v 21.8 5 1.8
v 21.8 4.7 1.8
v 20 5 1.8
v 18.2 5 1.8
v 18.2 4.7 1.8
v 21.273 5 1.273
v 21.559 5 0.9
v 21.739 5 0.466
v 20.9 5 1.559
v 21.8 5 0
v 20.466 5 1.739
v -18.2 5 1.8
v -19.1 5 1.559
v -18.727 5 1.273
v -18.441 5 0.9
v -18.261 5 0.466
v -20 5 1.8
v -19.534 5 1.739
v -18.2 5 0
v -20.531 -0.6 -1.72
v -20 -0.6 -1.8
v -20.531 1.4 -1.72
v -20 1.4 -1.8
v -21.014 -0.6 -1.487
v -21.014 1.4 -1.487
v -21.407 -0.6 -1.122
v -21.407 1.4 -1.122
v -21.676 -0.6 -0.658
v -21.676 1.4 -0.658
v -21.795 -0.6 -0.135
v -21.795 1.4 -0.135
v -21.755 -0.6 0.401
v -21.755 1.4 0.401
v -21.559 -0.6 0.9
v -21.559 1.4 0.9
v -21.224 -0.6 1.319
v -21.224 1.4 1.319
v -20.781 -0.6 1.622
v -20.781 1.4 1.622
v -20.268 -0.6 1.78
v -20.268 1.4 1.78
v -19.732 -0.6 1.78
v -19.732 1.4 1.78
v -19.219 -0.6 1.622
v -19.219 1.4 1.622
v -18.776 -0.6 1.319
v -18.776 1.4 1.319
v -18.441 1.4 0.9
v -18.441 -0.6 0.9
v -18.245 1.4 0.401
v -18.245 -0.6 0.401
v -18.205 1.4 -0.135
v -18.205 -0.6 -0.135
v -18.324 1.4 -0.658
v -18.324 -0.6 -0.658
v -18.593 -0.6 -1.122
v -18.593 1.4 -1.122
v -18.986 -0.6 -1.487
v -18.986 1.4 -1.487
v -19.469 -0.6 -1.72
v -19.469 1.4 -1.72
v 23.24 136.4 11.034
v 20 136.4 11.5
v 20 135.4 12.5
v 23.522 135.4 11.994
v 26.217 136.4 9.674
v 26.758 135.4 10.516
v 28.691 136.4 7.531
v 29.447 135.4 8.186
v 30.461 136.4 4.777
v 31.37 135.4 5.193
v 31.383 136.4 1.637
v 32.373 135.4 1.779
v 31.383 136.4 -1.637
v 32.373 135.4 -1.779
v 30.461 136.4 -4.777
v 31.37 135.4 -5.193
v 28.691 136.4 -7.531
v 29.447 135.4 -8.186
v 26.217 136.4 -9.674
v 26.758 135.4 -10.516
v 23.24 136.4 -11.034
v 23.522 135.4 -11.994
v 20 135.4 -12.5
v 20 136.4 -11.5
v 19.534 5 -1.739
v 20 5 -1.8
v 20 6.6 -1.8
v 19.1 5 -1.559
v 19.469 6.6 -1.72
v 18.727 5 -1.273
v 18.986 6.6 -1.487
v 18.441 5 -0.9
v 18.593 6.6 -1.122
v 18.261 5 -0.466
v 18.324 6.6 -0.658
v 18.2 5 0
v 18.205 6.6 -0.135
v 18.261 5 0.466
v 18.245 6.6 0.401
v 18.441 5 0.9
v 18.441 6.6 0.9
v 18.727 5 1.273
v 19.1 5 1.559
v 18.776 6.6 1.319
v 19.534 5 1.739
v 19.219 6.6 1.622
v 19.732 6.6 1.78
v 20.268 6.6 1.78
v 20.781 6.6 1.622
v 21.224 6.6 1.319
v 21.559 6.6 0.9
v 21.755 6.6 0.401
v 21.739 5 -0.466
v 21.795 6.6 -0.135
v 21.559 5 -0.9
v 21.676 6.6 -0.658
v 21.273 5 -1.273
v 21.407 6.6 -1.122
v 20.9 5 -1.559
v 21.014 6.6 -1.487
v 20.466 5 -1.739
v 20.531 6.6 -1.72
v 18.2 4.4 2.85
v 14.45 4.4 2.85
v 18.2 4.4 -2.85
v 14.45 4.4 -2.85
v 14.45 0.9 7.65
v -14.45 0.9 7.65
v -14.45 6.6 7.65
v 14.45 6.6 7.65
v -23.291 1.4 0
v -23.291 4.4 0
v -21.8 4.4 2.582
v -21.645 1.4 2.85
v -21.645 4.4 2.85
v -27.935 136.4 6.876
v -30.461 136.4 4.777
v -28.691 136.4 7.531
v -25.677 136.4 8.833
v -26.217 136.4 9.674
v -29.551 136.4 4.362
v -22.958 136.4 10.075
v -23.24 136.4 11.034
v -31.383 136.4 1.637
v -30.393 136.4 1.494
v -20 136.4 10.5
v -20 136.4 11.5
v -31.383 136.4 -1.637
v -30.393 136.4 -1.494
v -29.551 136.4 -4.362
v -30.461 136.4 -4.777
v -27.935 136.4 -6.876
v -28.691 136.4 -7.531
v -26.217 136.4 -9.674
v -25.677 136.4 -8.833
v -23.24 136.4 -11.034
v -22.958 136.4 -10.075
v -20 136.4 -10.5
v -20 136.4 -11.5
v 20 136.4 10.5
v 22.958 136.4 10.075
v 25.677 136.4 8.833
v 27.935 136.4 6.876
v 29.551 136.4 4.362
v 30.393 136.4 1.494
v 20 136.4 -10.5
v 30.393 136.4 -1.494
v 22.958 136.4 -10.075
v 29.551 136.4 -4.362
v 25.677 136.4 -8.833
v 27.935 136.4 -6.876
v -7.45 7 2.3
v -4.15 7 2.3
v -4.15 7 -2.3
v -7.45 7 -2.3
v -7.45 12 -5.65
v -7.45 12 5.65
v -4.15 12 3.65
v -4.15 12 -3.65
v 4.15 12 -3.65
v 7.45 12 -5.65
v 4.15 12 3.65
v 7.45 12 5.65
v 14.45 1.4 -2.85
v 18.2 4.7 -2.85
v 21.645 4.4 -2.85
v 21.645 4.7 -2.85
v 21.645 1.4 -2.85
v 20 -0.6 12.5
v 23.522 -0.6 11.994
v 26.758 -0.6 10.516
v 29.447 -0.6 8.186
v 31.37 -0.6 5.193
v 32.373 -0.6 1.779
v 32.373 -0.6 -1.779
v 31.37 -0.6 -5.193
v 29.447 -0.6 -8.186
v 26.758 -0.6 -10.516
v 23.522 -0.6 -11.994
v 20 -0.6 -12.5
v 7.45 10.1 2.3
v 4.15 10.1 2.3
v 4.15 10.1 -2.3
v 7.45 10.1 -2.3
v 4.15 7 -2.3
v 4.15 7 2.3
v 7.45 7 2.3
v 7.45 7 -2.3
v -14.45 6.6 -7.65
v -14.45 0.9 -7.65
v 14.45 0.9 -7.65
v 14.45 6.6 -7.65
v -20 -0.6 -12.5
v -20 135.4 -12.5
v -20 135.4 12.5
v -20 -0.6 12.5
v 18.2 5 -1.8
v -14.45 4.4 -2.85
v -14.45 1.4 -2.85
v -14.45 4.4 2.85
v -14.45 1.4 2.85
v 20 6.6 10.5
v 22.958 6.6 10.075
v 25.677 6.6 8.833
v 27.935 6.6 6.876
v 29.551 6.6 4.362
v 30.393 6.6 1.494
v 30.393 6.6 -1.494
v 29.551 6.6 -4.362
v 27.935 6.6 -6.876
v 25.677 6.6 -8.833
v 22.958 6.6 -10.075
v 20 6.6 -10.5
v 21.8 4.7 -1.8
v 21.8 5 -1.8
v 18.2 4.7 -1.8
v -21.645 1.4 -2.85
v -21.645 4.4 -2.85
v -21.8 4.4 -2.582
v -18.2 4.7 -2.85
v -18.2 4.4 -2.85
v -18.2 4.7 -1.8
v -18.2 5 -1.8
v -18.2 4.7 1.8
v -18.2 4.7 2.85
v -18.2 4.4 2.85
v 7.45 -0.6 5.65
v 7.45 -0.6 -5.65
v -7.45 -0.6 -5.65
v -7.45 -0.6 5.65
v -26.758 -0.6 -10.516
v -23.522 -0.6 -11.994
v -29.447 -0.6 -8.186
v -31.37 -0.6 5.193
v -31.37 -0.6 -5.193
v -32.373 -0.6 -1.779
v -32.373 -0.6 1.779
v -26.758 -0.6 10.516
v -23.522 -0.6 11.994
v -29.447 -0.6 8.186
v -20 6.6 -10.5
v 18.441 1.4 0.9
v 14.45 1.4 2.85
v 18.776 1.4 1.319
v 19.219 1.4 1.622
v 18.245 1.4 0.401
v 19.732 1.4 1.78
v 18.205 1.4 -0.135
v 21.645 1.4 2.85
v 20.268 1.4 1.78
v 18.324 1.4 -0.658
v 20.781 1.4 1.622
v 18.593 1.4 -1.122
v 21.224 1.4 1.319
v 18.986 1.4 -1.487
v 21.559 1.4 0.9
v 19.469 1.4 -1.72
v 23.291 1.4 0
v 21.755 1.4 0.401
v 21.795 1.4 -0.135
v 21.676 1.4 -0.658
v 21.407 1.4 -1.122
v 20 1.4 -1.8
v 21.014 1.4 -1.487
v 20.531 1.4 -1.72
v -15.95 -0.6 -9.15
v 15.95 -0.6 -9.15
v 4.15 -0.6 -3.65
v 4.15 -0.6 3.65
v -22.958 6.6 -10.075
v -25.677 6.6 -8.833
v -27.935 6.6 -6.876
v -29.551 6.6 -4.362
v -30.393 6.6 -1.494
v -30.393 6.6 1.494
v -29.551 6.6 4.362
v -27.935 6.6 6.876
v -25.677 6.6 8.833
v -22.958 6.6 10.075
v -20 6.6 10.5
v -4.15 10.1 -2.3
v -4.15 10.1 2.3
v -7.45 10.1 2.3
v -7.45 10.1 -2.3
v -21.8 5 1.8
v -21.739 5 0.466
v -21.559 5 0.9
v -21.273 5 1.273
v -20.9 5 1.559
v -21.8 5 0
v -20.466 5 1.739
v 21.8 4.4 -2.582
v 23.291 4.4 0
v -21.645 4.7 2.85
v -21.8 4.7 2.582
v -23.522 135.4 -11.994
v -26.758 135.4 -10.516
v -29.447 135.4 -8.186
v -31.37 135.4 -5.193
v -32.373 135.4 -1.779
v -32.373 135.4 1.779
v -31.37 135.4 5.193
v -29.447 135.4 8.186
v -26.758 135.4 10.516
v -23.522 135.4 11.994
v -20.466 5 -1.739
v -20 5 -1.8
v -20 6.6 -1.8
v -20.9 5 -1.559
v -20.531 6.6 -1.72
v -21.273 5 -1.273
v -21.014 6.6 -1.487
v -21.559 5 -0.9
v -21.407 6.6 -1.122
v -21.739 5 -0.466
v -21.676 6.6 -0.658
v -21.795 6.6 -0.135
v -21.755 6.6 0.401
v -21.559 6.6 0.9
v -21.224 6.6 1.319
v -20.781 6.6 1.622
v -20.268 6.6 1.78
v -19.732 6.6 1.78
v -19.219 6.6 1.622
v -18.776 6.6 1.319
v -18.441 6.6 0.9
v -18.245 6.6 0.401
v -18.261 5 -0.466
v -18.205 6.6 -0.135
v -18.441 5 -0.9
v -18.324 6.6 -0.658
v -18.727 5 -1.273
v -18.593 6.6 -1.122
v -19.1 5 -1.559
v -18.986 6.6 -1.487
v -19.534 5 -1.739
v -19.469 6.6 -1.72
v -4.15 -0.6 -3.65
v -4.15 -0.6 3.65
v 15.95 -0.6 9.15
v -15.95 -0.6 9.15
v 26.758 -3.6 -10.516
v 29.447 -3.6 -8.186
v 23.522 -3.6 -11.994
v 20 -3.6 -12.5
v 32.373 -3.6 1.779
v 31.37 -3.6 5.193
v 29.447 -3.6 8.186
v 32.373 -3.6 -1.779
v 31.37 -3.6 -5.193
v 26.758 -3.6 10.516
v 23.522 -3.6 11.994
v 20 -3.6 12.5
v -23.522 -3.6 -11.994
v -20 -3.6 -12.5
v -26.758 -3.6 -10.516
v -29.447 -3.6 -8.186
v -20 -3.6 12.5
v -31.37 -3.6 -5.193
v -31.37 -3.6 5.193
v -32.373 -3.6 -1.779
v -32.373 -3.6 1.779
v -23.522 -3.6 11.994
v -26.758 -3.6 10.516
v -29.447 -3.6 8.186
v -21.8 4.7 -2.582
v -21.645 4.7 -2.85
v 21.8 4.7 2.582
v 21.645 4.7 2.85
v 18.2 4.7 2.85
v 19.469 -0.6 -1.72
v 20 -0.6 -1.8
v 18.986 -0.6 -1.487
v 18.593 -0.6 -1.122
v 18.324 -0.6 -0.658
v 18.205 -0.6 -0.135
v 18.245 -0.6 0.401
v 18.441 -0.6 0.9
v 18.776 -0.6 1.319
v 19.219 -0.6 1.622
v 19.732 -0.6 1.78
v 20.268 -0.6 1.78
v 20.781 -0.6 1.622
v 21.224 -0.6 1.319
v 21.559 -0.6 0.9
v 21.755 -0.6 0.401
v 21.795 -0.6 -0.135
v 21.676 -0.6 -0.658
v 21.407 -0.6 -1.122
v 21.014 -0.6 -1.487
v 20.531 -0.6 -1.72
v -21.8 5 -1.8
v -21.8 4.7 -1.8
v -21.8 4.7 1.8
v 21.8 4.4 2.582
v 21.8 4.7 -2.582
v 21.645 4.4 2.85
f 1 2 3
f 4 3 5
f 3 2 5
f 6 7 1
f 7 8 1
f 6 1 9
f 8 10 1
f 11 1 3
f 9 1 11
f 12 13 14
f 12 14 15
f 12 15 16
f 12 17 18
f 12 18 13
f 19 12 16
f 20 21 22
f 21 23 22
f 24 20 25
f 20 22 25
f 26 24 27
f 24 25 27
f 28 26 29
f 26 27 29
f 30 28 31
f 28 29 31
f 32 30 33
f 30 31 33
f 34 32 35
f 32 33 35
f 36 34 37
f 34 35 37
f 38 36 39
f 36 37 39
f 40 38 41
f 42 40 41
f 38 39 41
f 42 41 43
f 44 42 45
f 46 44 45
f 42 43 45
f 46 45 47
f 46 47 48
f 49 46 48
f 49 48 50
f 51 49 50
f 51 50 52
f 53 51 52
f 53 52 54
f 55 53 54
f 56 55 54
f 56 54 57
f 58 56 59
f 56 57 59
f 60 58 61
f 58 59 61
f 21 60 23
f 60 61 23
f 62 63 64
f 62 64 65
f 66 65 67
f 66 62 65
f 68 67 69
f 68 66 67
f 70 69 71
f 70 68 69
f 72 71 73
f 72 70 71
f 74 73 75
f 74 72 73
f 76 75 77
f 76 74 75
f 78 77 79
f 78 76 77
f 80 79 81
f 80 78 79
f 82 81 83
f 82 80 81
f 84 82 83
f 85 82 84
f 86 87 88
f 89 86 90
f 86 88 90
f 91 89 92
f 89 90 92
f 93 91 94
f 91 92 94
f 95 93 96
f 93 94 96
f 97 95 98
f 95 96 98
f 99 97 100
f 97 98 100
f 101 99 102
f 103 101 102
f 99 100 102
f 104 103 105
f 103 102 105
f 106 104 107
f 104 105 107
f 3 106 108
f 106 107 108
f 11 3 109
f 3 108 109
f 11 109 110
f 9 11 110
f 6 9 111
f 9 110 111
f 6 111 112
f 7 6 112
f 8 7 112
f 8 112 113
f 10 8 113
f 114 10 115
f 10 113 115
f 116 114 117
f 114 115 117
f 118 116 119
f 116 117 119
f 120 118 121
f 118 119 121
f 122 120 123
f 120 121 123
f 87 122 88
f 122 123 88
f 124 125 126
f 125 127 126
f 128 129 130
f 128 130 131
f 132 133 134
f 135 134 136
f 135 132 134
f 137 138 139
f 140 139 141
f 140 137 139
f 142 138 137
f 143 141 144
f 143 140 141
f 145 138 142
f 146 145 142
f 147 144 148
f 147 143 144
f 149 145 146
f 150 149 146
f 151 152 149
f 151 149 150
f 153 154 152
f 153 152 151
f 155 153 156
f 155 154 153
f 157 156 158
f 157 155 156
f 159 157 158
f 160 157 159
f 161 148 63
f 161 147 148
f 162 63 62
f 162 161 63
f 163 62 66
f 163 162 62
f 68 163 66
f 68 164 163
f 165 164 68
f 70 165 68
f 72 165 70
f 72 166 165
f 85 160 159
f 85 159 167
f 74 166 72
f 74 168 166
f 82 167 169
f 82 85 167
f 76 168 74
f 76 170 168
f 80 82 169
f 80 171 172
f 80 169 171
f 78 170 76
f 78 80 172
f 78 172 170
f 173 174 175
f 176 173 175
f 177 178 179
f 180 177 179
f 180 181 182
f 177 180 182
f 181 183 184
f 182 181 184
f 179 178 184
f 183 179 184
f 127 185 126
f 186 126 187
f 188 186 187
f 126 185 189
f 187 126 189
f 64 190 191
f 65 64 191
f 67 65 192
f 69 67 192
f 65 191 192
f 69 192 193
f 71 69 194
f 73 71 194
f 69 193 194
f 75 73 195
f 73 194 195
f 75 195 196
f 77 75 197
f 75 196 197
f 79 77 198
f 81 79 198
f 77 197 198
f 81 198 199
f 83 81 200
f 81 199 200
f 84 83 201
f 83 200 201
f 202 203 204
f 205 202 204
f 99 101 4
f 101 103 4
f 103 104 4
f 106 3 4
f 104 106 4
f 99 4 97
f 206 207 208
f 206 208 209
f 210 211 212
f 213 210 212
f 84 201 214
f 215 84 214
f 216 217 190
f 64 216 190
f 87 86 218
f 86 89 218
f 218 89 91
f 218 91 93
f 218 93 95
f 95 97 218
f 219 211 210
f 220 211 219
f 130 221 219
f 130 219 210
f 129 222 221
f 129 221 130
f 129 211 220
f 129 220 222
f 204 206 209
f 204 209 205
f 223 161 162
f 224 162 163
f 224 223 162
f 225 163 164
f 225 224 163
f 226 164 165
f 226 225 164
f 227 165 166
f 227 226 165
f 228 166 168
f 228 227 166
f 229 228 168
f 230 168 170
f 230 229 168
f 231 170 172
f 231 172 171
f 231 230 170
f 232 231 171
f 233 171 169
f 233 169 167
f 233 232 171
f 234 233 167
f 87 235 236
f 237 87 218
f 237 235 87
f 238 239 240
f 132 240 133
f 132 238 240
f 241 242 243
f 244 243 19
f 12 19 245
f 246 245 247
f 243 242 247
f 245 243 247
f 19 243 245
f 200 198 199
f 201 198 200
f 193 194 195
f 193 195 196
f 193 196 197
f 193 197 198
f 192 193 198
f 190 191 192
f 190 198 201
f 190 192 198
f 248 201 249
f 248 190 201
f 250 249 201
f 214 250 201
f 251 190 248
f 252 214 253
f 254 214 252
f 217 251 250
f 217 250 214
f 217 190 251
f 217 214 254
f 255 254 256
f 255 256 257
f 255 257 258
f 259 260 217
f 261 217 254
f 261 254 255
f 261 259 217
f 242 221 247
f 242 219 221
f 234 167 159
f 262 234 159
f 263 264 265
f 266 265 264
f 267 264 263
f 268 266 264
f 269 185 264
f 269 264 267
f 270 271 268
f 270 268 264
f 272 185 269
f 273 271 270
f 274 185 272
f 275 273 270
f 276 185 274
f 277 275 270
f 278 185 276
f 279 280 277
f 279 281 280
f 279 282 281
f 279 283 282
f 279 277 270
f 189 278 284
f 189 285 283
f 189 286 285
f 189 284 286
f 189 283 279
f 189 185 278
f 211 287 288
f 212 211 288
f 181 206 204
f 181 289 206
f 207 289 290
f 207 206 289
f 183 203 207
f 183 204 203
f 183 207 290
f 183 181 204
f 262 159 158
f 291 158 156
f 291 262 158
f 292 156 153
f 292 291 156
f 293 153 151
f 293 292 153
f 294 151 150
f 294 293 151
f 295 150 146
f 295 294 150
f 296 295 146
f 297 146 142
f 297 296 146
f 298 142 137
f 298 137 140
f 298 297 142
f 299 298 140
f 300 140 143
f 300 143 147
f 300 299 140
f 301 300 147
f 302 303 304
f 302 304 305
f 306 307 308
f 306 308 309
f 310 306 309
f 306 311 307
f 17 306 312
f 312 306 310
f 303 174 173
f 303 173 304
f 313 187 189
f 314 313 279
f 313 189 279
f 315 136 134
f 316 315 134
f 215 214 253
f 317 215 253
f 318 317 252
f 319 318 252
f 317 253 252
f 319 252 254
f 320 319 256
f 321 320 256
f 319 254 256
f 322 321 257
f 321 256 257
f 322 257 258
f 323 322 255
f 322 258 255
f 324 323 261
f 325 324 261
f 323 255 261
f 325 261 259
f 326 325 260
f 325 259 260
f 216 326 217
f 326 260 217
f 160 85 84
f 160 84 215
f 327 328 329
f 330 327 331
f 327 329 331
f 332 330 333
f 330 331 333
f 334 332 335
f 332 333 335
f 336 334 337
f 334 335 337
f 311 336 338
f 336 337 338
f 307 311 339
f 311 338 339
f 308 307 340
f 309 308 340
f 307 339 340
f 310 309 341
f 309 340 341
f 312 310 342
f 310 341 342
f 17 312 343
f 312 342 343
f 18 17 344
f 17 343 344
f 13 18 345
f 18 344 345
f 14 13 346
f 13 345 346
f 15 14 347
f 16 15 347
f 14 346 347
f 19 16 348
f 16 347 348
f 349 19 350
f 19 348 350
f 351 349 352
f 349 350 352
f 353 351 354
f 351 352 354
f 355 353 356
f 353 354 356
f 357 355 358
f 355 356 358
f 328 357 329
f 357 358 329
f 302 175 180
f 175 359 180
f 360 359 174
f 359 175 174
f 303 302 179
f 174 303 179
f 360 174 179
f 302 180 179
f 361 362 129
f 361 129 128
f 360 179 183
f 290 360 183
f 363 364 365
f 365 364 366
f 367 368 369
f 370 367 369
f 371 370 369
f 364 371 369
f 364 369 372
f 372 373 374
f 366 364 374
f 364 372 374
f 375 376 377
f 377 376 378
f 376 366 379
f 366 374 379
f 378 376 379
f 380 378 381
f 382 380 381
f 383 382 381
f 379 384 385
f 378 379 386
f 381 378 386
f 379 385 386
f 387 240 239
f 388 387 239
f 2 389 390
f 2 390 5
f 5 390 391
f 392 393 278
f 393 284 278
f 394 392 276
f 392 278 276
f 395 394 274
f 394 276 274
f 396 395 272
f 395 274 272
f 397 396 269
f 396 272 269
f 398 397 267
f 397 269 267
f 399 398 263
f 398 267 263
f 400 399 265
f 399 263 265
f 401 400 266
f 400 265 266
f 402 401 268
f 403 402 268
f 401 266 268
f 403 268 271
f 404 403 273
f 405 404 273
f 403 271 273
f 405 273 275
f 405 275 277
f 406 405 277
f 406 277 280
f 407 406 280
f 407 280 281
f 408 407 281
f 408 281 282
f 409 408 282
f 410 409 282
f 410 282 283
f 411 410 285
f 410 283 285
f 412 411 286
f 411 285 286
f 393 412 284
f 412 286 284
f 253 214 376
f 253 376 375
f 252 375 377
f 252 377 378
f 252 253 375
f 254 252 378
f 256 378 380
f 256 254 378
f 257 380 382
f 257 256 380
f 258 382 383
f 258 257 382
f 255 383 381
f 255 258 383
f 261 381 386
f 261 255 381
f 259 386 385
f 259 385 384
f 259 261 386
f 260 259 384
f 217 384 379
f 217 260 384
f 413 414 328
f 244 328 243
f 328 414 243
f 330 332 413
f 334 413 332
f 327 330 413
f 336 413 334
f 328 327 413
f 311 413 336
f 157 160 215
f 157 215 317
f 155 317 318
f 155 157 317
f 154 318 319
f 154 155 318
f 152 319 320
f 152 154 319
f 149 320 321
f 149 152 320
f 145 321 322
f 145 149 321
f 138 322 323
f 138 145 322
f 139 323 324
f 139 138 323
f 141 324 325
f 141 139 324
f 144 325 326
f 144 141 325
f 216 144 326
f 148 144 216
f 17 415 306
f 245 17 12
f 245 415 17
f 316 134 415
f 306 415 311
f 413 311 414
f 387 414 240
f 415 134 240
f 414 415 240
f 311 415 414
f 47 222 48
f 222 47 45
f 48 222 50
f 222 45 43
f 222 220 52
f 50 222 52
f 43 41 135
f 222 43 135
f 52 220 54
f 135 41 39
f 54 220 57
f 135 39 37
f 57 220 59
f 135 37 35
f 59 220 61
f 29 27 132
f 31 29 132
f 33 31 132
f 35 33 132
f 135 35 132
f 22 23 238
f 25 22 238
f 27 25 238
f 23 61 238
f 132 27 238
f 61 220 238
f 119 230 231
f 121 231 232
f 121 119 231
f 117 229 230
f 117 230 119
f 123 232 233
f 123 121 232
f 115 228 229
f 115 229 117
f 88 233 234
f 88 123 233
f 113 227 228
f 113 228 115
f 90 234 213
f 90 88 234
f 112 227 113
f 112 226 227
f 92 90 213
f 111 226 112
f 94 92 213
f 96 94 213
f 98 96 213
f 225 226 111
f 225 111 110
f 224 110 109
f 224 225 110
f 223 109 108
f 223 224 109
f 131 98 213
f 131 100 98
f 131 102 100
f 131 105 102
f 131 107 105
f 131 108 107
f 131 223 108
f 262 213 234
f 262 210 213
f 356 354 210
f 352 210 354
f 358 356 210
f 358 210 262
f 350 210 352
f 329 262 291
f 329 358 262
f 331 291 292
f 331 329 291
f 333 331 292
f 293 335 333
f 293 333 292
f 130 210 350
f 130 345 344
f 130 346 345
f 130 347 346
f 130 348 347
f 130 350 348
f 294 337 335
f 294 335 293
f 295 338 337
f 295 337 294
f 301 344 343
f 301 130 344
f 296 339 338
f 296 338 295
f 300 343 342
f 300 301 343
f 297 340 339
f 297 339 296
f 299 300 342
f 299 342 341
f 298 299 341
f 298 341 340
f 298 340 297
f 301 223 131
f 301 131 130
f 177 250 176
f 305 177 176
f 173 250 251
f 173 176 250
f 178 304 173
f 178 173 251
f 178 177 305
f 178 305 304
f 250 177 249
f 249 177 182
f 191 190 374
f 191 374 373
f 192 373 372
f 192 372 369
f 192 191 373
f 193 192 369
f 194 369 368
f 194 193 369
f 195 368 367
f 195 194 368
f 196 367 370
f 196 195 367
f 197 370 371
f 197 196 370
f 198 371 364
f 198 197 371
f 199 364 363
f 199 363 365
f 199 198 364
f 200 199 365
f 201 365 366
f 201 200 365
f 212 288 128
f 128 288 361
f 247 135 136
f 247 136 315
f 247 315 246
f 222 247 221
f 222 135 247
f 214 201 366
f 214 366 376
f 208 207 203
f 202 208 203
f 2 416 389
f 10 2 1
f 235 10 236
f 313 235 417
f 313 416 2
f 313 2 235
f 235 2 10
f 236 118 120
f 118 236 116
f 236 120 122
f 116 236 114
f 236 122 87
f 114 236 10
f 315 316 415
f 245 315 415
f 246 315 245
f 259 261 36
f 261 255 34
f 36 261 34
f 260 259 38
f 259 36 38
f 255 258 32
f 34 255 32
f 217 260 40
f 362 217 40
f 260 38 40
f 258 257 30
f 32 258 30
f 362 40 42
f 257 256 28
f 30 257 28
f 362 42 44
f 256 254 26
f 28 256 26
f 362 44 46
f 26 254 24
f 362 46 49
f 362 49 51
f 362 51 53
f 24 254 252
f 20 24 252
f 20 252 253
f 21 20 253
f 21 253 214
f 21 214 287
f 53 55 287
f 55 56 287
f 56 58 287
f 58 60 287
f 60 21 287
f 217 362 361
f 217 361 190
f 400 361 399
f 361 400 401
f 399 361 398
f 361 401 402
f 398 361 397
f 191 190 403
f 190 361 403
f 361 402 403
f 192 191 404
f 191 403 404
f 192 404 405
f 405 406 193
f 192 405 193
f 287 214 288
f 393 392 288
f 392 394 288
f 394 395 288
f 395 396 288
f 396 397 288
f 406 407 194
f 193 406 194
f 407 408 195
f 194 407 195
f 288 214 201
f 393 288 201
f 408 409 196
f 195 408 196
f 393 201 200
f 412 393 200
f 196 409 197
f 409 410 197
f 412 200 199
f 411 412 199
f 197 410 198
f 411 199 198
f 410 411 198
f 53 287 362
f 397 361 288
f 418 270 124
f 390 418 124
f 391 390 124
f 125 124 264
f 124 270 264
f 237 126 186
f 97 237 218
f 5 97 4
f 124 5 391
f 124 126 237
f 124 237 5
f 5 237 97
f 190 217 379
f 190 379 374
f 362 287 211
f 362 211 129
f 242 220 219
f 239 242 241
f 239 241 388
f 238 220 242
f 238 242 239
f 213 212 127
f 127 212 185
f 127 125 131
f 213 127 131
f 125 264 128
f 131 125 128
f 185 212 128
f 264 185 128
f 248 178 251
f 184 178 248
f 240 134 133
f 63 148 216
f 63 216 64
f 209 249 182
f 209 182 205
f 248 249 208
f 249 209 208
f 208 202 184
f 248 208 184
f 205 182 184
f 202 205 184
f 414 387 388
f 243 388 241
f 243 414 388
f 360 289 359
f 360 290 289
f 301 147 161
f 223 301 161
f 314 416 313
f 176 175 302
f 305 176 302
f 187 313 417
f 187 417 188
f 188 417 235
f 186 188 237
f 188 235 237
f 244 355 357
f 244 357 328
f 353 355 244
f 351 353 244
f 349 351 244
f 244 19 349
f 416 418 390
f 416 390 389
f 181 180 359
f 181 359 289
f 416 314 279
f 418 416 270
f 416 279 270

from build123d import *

# Parameters (mm, degrees)
SKETCH2_W                     = 14.9
SKETCH2_H                     = 11.3
SKETCH2_W_2                   = 8.3
SKETCH2_H_2                   = 7.3
BOSS_EXTRUDE1_DEPTH           = 12.6
SKETCH4_W                     = 4.6
SKETCH4_H                     = 3.1
CUT_EXTRUDE1_DEPTH            = 8.45
CUT_EXTRUDE1_DEPTH_BACK       = 8.45
BOSS_EXTRUDE2_DEPTH           = 3
BOSS_EXTRUDE3_DEPTH           = 137
SKETCH8_W                     = 28.9
SKETCH8_H                     = 15.3
BOSS_EXTRUDE4_DEPTH           = 7.2
SKETCH11_W                    = 1.8
SKETCH11_H                    = 137
M3_CLEARANCE_HOLE1_AT_2_COUNT = 2
M3_CLEARANCE_HOLE1_AT_2_PITCH = 40
CUT_EXTRUDE2_DEPTH            = 3
CUT_EXTRUDE3_DEPTH            = 0.3
SKETCH15_W                    = 3.6
SKETCH15_H                    = 3.6
CUT_EXTRUDE4_DEPTH            = 0.3
CHAMFER1_SIZE                 = 1
CHAMFER2_SIZE                 = 1.5


with BuildPart() as part:
    # Sketch2 → Boss-Extrude1 (new body)
    with BuildSketch(Plane.XZ.offset(-12)):
        Rectangle(SKETCH2_W, SKETCH2_H)
        Rectangle(SKETCH2_W_2, SKETCH2_H_2, mode=Mode.SUBTRACT)
    extrude(amount=BOSS_EXTRUDE1_DEPTH)

    # Sketch4 → Cut-Extrude1 (cut, two sides)
    with BuildSketch(Plane(origin=(0, 0, 0), x_dir=(0, 0, -1), z_dir=(1, 0, 0))) as cut_extrude1_sk:
        with Locations((0, 8.55)):
            Rectangle(SKETCH4_W, SKETCH4_H)
    extrude(amount=CUT_EXTRUDE1_DEPTH, mode=Mode.SUBTRACT)
    extrude(cut_extrude1_sk.sketch, amount=-CUT_EXTRUDE1_DEPTH_BACK, mode=Mode.SUBTRACT)

    # Sketch5 → Boss-Extrude2 (add)
    with BuildSketch(Plane.XZ.offset(0.6)):
        with BuildLine():
            Line((-20, 12.5), (20, 12.5))
            ThreePointArc((20, 12.5), (32.5, 0), (20, -12.5))
            Line((20, -12.5), (-20, -12.5))
            ThreePointArc((-20, -12.5), (-32.5, 0), (-20, 12.5))
        make_face()
    extrude(amount=BOSS_EXTRUDE2_DEPTH)


with BuildPart() as body_2:
    # Sketch7 → Boss-Extrude3 (new body)
    with BuildSketch(Plane(origin=(0, -0.6, 0), x_dir=(1, 0, 0), z_dir=(0, 1, 0))):
        with BuildLine():
            Line((-20, -12.5), (20, -12.5))
            ThreePointArc((20, -12.5), (32.5, 0), (20, 12.5))
            Line((20, 12.5), (-20, 12.5))
            ThreePointArc((-20, 12.5), (-32.5, 0), (-20, -12.5))
        make_face()
        with BuildLine():
            Line((-20, -10.5), (20, -10.5))
            ThreePointArc((20, -10.5), (30.5, 0), (20, 10.5))
            Line((20, 10.5), (-20, 10.5))
            ThreePointArc((-20, 10.5), (-30.5, 0), (-20, -10.5))
        make_face(mode=Mode.SUBTRACT)
    extrude(amount=BOSS_EXTRUDE3_DEPTH)

    # Sketch8 → Boss-Extrude4 (add)
    with BuildSketch(Plane.XZ.offset(0.6)):
        with BuildLine():
            Line((20, -12.5), (-20, -12.5))
            ThreePointArc((-20, -12.5), (-32.5, 0), (-20, 12.5))
            Line((-20, 12.5), (20, 12.5))
            ThreePointArc((20, 12.5), (32.5, 0), (20, -12.5))
        make_face()
        Rectangle(SKETCH8_W, SKETCH8_H, mode=Mode.SUBTRACT)
    extrude(amount=-BOSS_EXTRUDE4_DEPTH)

    # Sketch11 → M3 Clearance Hole1 (revolve, cut)
    with BuildSketch(Plane(origin=(-20, -0.6, 0), x_dir=(0, 0, -1), z_dir=(1, 0, 0))):
        with Locations((0.9, 68.5)):
            Rectangle(SKETCH11_W, SKETCH11_H)
    m3_clearance_hole1 = revolve(axis=Axis((-20, -6.95, 0), (0, 1, 0)), mode=Mode.SUBTRACT)

    # M3 Clearance Hole1 at 2: M3 Clearance Hole1 ×2
    with Locations(*[(i * M3_CLEARANCE_HOLE1_AT_2_PITCH, 0, 0) for i in range(1, M3_CLEARANCE_HOLE1_AT_2_COUNT)]):
        add(m3_clearance_hole1, mode=Mode.SUBTRACT)

    # Sketch13 → Cut-Extrude2 (cut)
    with BuildSketch(Plane(origin=(0, 1.4, 0), x_dir=(1, 0, 0), z_dir=(0, 1, 0))):
        Polygon((-14.45, -2.85), (-18.354551733, -2.85), (-16.709103466, 0), (-18.354551733, 2.85), (-14.45, 2.85), align=None)
        Polygon((-18.354551733, -2.85), (-16.709103466, 0), (-18.354551733, 2.85), (-21.645448267, 2.85), (-23.290896534, 0), (-21.645448267, -2.85), align=None)
    cut_extrude2 = extrude(amount=CUT_EXTRUDE2_DEPTH, mode=Mode.SUBTRACT)

    # Sketch14 → Cut-Extrude3 (cut)
    with BuildSketch(Plane.XZ.offset(-4.4)):
        with BuildLine():
            ThreePointArc((-18.2, 0), (-20.00000001, -1.8), (-21.8, 2e-08))
            Line((-21.8, 2e-08), (-21.8, -2.582308546))
            Line((-21.8, -2.582308546), (-21.645448267, -2.85))
            Line((-21.645448267, -2.85), (-18.2, -2.85))
            Line((-18.2, -2.85), (-18.2, 0))
        make_face()
        with BuildLine():
            Line((-18.2, 2.85), (-21.645448267, 2.85))
            Line((-21.645448267, 2.85), (-21.8, 2.582308546))
            Line((-21.8, 2.582308546), (-21.8, 2e-08))
            ThreePointArc((-21.8, 2e-08), (-19.99999999, 1.8), (-18.2, 0))
            Line((-18.2, 0), (-18.2, 2.85))
        make_face()
    cut_extrude3 = extrude(amount=-CUT_EXTRUDE3_DEPTH, mode=Mode.SUBTRACT)

    # Sketch15 → Cut-Extrude4 (cut)
    with BuildSketch(Plane.XZ.offset(-4.7)):
        with Locations((-20, 0)):
            Rectangle(SKETCH15_W, SKETCH15_H)
    cut_extrude4 = extrude(amount=-CUT_EXTRUDE4_DEPTH, mode=Mode.SUBTRACT)

    # Chamfer1
    chamfer1_edges = [body_2.edges().sort_by_distance(p)[0] for p in [
        (32.5, 136.4, 0),
        (0, 136.4, -12.5),
        (-32.5, 136.4, 0),
        (0, 136.4, 12.5),
    ]]
    chamfer(chamfer1_edges, length=CHAMFER1_SIZE)

    # Mirror1: Cut-Extrude2, Cut-Extrude3, Cut-Extrude4 across plane
    add(cut_extrude2.mirror(Plane(origin=(0, 0, 0), x_dir=(0, 0, 1), z_dir=(1, 0, 0))), mode=Mode.SUBTRACT)
    add(cut_extrude3.mirror(Plane(origin=(0, 0, 0), x_dir=(0, 0, 1), z_dir=(1, 0, 0))), mode=Mode.SUBTRACT)
    add(cut_extrude4.mirror(Plane(origin=(0, 0, 0), x_dir=(0, 0, 1), z_dir=(1, 0, 0))), mode=Mode.SUBTRACT)

    # Chamfer2
    chamfer2_edges = [body_2.edges().sort_by_distance(p)[0] for p in [
        (-14.45, -0.6, 0),
        (0, -0.6, 7.65),
        (14.45, -0.6, 0),
        (0, -0.6, -7.65),
    ]]
    chamfer(chamfer2_edges, length=CHAMFER2_SIZE)


solid = Compound([part.part, body_2.part])
